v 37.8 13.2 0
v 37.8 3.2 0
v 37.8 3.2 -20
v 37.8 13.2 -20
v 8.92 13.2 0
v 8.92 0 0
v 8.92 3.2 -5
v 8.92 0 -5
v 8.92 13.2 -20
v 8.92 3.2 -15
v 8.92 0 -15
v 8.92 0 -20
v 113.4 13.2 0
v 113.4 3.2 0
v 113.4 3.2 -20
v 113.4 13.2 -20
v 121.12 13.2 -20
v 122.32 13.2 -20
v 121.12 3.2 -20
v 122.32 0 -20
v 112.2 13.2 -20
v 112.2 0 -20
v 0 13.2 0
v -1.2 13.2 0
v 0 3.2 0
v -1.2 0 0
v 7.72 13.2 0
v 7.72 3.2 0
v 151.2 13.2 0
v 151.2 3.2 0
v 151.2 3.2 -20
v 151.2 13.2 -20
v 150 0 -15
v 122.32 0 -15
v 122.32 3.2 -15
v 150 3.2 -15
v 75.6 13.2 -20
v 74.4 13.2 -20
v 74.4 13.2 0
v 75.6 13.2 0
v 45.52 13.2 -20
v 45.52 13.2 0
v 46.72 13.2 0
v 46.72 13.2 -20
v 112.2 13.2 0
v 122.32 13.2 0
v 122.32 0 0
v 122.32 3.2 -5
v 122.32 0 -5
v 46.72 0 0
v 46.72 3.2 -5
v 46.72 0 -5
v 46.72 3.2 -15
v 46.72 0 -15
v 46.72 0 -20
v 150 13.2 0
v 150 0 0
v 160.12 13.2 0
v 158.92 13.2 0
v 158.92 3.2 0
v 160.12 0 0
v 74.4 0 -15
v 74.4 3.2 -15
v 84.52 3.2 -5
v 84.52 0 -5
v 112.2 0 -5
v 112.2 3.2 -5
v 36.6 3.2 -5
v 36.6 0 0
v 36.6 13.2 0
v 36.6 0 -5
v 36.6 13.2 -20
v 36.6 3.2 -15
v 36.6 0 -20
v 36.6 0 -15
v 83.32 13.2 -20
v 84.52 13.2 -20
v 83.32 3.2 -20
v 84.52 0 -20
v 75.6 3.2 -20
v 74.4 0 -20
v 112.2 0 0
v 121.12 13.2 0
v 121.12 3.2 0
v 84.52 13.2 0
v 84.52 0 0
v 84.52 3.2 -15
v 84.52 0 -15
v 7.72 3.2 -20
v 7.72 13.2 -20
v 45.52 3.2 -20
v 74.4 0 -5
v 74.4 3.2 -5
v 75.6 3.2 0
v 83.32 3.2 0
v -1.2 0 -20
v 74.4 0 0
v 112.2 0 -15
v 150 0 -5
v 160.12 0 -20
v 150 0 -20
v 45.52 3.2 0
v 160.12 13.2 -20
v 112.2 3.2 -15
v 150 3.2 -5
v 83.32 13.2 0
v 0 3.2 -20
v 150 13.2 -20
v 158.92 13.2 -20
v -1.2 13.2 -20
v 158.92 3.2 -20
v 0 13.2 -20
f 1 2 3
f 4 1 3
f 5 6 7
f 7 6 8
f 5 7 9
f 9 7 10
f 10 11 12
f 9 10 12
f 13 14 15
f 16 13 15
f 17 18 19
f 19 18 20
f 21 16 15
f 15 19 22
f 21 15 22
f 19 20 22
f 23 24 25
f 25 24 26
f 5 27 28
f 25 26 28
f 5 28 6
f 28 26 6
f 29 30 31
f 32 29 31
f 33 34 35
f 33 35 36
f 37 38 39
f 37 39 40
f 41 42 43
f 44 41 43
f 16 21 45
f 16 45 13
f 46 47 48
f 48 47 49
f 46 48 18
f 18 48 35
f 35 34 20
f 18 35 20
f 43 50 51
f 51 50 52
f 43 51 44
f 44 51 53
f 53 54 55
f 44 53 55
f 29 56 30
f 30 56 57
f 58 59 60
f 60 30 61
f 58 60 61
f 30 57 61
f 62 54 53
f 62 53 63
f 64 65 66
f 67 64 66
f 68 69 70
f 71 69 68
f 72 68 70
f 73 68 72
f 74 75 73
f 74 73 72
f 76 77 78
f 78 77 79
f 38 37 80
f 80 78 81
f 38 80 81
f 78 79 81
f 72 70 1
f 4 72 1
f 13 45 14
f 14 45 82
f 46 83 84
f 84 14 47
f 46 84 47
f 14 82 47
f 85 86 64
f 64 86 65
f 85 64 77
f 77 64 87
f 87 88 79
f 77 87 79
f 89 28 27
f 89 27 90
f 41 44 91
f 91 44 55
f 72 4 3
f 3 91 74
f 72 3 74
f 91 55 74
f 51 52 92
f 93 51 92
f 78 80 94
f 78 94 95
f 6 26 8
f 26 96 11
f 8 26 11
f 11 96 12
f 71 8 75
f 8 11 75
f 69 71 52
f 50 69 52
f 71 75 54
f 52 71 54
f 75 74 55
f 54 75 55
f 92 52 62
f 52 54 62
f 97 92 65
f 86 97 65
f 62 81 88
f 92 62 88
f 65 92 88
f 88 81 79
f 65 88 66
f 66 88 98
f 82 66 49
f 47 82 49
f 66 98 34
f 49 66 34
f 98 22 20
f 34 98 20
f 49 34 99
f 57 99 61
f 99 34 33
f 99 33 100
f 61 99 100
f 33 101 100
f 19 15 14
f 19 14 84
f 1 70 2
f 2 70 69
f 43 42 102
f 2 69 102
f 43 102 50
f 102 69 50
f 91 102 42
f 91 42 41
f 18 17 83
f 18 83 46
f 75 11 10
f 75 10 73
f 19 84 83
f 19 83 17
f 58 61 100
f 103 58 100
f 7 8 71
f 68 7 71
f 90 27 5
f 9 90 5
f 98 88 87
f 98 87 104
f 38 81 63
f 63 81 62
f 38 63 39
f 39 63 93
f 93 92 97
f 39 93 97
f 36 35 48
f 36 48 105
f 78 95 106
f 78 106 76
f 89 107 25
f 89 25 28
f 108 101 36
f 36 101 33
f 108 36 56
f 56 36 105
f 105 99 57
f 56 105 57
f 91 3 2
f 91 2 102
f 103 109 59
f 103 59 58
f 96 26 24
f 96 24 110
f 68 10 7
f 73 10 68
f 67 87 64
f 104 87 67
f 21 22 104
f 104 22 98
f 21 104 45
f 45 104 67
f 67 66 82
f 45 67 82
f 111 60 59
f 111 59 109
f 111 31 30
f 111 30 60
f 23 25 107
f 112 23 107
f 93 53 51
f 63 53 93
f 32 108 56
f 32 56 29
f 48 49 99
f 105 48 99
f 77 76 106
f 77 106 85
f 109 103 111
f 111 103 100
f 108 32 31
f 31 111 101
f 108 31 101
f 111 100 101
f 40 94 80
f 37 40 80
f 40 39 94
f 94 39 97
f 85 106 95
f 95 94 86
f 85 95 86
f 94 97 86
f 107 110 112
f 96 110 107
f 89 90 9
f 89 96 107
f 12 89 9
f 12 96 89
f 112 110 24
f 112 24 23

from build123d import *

# Parameters (mm, degrees)
SKIZZE1_W                       = 7.72
SKIZZE1_H                       = 10
SKIZZE1_W_2                     = 1.2
SKIZZE1_H_2                     = 20
SKIZZE1_W_3                     = 27.68
SKIZZE1_H_3                     = 5
AUFSATZ_LINEAR_AUSTRAGEN5_DEPTH = 3.2
SKIZZE2_W                       = 1.2
SKIZZE2_H                       = 20
AUFSATZ_LINEAR_AUSTRAGEN6_DEPTH = 10


with BuildPart() as part:
    # Skizze1 → Aufsatz-Linear austragen5 (new body)
    with BuildSketch(Plane(origin=(0, 0, 0), x_dir=(1, 0, 0), z_dir=(0, 1, 0))):
        with Locations((3.86, 15)):
            Rectangle(SKIZZE1_W, SKIZZE1_H)
        with Locations((-0.6, 10)):
            Rectangle(SKIZZE1_W_2, SKIZZE1_H_2)
        with Locations((3.86, 5)):
            Rectangle(SKIZZE1_W, SKIZZE1_H)
        Polygon((8.92, 20), (7.72, 20), (7.72, 10), (8.92, 10), (8.92, 15), align=None)
        Polygon((8.92, 10), (7.72, 10), (7.72, 0), (8.92, 0), (8.92, 5), align=None)
        with Locations((22.76, 12.5)):
            Rectangle(SKIZZE1_W_3, SKIZZE1_H_3)
        with Locations((22.76, 7.5)):
            Rectangle(SKIZZE1_W_3, SKIZZE1_H_3)
        Polygon((36.6, 20), (36.6, 15), (36.6, 10), (37.8, 10), (37.8, 20), align=None)
        Polygon((37.8, 10), (36.6, 10), (36.6, 5), (36.6, 0), (37.8, 0), align=None)
        with Locations((41.66, 15)):
            Rectangle(SKIZZE1_W, SKIZZE1_H)
        Polygon((45.52, 20), (45.52, 10), (46.72, 10), (46.72, 15), (46.72, 20), align=None)
        Polygon((46.72, 10), (45.52, 10), (45.52, 0), (46.72, 0), (46.72, 5), align=None)
        with Locations((41.66, 5)):
            Rectangle(SKIZZE1_W, SKIZZE1_H)
        with Locations((60.56, 12.5)):
            Rectangle(SKIZZE1_W_3, SKIZZE1_H_3)
        with Locations((60.56, 7.5)):
            Rectangle(SKIZZE1_W_3, SKIZZE1_H_3)
        with Locations((79.46, 15)):
            Rectangle(SKIZZE1_W, SKIZZE1_H)
        Polygon((74.4, 15), (74.4, 10), (75.6, 10), (75.6, 20), (74.4, 20), align=None)
        Polygon((75.6, 10), (74.4, 10), (74.4, 5), (74.4, 0), (75.6, 0), align=None)
        with Locations((79.46, 5)):
            Rectangle(SKIZZE1_W, SKIZZE1_H)
        Polygon((83.32, 20), (83.32, 10), (84.52, 10), (84.52, 15), (84.52, 20), align=None)
        Polygon((84.52, 10), (83.32, 10), (83.32, 0), (84.52, 0), (84.52, 5), align=None)
        with Locations((98.36, 12.5)):
            Rectangle(SKIZZE1_W_3, SKIZZE1_H_3)
        with Locations((98.36, 7.5)):
            Rectangle(SKIZZE1_W_3, SKIZZE1_H_3)
        with Locations((117.26, 15)):
            Rectangle(SKIZZE1_W, SKIZZE1_H)
        Polygon((112.2, 15), (112.2, 10), (113.4, 10), (113.4, 20), (112.2, 20), align=None)
        Polygon((113.4, 10), (112.2, 10), (112.2, 5), (112.2, 0), (113.4, 0), align=None)
        Polygon((121.12, 20), (121.12, 10), (122.32, 10), (122.32, 15), (122.32, 20), align=None)
        with Locations((117.26, 5)):
            Rectangle(SKIZZE1_W, SKIZZE1_H)
        Polygon((122.32, 10), (121.12, 10), (121.12, 0), (122.32, 0), (122.32, 5), align=None)
        with Locations((136.16, 12.5)):
            Rectangle(SKIZZE1_W_3, SKIZZE1_H_3)
        with Locations((136.16, 7.5)):
            Rectangle(SKIZZE1_W_3, SKIZZE1_H_3)
        Polygon((150, 15), (150, 10), (151.2, 10), (151.2, 20), (150, 20), align=None)
        Polygon((151.2, 10), (150, 10), (150, 5), (150, 0), (151.2, 0), align=None)
        with Locations((155.06, 15)):
            Rectangle(SKIZZE1_W, SKIZZE1_H)
        with Locations((159.52, 15)):
            Rectangle(SKIZZE1_W_2, SKIZZE1_H)
        with Locations((155.06, 5)):
            Rectangle(SKIZZE1_W, SKIZZE1_H)
        with Locations((159.52, 5)):
            Rectangle(SKIZZE1_W_2, SKIZZE1_H)
    extrude(amount=AUFSATZ_LINEAR_AUSTRAGEN5_DEPTH)

    # Skizze2 → Aufsatz-Linear austragen6 (add)
    with BuildSketch(Plane(origin=(0, 3.2, 0), x_dir=(1, 0, 0), z_dir=(0, 1, 0))):
        with Locations((8.32, 10)):
            Rectangle(SKIZZE2_W, SKIZZE2_H)
        with Locations((-0.6, 10)):
            Rectangle(SKIZZE2_W, SKIZZE2_H)
        with Locations((37.2, 10)):
            Rectangle(SKIZZE2_W, SKIZZE2_H)
        with Locations((46.12, 10)):
            Rectangle(SKIZZE2_W, SKIZZE2_H)
        with Locations((75, 10)):
            Rectangle(SKIZZE2_W, SKIZZE2_H)
        with Locations((83.92, 10)):
            Rectangle(SKIZZE2_W, SKIZZE2_H)
        with Locations((112.8, 10)):
            Rectangle(SKIZZE2_W, SKIZZE2_H)
        with Locations((121.72, 10)):
            Rectangle(SKIZZE2_W, SKIZZE2_H)
        with Locations((150.6, 10)):
            Rectangle(SKIZZE2_W, SKIZZE2_H)
        with Locations((159.52, 10)):
            Rectangle(SKIZZE2_W, SKIZZE2_H)
    extrude(amount=AUFSATZ_LINEAR_AUSTRAGEN6_DEPTH)


solid = part.part
